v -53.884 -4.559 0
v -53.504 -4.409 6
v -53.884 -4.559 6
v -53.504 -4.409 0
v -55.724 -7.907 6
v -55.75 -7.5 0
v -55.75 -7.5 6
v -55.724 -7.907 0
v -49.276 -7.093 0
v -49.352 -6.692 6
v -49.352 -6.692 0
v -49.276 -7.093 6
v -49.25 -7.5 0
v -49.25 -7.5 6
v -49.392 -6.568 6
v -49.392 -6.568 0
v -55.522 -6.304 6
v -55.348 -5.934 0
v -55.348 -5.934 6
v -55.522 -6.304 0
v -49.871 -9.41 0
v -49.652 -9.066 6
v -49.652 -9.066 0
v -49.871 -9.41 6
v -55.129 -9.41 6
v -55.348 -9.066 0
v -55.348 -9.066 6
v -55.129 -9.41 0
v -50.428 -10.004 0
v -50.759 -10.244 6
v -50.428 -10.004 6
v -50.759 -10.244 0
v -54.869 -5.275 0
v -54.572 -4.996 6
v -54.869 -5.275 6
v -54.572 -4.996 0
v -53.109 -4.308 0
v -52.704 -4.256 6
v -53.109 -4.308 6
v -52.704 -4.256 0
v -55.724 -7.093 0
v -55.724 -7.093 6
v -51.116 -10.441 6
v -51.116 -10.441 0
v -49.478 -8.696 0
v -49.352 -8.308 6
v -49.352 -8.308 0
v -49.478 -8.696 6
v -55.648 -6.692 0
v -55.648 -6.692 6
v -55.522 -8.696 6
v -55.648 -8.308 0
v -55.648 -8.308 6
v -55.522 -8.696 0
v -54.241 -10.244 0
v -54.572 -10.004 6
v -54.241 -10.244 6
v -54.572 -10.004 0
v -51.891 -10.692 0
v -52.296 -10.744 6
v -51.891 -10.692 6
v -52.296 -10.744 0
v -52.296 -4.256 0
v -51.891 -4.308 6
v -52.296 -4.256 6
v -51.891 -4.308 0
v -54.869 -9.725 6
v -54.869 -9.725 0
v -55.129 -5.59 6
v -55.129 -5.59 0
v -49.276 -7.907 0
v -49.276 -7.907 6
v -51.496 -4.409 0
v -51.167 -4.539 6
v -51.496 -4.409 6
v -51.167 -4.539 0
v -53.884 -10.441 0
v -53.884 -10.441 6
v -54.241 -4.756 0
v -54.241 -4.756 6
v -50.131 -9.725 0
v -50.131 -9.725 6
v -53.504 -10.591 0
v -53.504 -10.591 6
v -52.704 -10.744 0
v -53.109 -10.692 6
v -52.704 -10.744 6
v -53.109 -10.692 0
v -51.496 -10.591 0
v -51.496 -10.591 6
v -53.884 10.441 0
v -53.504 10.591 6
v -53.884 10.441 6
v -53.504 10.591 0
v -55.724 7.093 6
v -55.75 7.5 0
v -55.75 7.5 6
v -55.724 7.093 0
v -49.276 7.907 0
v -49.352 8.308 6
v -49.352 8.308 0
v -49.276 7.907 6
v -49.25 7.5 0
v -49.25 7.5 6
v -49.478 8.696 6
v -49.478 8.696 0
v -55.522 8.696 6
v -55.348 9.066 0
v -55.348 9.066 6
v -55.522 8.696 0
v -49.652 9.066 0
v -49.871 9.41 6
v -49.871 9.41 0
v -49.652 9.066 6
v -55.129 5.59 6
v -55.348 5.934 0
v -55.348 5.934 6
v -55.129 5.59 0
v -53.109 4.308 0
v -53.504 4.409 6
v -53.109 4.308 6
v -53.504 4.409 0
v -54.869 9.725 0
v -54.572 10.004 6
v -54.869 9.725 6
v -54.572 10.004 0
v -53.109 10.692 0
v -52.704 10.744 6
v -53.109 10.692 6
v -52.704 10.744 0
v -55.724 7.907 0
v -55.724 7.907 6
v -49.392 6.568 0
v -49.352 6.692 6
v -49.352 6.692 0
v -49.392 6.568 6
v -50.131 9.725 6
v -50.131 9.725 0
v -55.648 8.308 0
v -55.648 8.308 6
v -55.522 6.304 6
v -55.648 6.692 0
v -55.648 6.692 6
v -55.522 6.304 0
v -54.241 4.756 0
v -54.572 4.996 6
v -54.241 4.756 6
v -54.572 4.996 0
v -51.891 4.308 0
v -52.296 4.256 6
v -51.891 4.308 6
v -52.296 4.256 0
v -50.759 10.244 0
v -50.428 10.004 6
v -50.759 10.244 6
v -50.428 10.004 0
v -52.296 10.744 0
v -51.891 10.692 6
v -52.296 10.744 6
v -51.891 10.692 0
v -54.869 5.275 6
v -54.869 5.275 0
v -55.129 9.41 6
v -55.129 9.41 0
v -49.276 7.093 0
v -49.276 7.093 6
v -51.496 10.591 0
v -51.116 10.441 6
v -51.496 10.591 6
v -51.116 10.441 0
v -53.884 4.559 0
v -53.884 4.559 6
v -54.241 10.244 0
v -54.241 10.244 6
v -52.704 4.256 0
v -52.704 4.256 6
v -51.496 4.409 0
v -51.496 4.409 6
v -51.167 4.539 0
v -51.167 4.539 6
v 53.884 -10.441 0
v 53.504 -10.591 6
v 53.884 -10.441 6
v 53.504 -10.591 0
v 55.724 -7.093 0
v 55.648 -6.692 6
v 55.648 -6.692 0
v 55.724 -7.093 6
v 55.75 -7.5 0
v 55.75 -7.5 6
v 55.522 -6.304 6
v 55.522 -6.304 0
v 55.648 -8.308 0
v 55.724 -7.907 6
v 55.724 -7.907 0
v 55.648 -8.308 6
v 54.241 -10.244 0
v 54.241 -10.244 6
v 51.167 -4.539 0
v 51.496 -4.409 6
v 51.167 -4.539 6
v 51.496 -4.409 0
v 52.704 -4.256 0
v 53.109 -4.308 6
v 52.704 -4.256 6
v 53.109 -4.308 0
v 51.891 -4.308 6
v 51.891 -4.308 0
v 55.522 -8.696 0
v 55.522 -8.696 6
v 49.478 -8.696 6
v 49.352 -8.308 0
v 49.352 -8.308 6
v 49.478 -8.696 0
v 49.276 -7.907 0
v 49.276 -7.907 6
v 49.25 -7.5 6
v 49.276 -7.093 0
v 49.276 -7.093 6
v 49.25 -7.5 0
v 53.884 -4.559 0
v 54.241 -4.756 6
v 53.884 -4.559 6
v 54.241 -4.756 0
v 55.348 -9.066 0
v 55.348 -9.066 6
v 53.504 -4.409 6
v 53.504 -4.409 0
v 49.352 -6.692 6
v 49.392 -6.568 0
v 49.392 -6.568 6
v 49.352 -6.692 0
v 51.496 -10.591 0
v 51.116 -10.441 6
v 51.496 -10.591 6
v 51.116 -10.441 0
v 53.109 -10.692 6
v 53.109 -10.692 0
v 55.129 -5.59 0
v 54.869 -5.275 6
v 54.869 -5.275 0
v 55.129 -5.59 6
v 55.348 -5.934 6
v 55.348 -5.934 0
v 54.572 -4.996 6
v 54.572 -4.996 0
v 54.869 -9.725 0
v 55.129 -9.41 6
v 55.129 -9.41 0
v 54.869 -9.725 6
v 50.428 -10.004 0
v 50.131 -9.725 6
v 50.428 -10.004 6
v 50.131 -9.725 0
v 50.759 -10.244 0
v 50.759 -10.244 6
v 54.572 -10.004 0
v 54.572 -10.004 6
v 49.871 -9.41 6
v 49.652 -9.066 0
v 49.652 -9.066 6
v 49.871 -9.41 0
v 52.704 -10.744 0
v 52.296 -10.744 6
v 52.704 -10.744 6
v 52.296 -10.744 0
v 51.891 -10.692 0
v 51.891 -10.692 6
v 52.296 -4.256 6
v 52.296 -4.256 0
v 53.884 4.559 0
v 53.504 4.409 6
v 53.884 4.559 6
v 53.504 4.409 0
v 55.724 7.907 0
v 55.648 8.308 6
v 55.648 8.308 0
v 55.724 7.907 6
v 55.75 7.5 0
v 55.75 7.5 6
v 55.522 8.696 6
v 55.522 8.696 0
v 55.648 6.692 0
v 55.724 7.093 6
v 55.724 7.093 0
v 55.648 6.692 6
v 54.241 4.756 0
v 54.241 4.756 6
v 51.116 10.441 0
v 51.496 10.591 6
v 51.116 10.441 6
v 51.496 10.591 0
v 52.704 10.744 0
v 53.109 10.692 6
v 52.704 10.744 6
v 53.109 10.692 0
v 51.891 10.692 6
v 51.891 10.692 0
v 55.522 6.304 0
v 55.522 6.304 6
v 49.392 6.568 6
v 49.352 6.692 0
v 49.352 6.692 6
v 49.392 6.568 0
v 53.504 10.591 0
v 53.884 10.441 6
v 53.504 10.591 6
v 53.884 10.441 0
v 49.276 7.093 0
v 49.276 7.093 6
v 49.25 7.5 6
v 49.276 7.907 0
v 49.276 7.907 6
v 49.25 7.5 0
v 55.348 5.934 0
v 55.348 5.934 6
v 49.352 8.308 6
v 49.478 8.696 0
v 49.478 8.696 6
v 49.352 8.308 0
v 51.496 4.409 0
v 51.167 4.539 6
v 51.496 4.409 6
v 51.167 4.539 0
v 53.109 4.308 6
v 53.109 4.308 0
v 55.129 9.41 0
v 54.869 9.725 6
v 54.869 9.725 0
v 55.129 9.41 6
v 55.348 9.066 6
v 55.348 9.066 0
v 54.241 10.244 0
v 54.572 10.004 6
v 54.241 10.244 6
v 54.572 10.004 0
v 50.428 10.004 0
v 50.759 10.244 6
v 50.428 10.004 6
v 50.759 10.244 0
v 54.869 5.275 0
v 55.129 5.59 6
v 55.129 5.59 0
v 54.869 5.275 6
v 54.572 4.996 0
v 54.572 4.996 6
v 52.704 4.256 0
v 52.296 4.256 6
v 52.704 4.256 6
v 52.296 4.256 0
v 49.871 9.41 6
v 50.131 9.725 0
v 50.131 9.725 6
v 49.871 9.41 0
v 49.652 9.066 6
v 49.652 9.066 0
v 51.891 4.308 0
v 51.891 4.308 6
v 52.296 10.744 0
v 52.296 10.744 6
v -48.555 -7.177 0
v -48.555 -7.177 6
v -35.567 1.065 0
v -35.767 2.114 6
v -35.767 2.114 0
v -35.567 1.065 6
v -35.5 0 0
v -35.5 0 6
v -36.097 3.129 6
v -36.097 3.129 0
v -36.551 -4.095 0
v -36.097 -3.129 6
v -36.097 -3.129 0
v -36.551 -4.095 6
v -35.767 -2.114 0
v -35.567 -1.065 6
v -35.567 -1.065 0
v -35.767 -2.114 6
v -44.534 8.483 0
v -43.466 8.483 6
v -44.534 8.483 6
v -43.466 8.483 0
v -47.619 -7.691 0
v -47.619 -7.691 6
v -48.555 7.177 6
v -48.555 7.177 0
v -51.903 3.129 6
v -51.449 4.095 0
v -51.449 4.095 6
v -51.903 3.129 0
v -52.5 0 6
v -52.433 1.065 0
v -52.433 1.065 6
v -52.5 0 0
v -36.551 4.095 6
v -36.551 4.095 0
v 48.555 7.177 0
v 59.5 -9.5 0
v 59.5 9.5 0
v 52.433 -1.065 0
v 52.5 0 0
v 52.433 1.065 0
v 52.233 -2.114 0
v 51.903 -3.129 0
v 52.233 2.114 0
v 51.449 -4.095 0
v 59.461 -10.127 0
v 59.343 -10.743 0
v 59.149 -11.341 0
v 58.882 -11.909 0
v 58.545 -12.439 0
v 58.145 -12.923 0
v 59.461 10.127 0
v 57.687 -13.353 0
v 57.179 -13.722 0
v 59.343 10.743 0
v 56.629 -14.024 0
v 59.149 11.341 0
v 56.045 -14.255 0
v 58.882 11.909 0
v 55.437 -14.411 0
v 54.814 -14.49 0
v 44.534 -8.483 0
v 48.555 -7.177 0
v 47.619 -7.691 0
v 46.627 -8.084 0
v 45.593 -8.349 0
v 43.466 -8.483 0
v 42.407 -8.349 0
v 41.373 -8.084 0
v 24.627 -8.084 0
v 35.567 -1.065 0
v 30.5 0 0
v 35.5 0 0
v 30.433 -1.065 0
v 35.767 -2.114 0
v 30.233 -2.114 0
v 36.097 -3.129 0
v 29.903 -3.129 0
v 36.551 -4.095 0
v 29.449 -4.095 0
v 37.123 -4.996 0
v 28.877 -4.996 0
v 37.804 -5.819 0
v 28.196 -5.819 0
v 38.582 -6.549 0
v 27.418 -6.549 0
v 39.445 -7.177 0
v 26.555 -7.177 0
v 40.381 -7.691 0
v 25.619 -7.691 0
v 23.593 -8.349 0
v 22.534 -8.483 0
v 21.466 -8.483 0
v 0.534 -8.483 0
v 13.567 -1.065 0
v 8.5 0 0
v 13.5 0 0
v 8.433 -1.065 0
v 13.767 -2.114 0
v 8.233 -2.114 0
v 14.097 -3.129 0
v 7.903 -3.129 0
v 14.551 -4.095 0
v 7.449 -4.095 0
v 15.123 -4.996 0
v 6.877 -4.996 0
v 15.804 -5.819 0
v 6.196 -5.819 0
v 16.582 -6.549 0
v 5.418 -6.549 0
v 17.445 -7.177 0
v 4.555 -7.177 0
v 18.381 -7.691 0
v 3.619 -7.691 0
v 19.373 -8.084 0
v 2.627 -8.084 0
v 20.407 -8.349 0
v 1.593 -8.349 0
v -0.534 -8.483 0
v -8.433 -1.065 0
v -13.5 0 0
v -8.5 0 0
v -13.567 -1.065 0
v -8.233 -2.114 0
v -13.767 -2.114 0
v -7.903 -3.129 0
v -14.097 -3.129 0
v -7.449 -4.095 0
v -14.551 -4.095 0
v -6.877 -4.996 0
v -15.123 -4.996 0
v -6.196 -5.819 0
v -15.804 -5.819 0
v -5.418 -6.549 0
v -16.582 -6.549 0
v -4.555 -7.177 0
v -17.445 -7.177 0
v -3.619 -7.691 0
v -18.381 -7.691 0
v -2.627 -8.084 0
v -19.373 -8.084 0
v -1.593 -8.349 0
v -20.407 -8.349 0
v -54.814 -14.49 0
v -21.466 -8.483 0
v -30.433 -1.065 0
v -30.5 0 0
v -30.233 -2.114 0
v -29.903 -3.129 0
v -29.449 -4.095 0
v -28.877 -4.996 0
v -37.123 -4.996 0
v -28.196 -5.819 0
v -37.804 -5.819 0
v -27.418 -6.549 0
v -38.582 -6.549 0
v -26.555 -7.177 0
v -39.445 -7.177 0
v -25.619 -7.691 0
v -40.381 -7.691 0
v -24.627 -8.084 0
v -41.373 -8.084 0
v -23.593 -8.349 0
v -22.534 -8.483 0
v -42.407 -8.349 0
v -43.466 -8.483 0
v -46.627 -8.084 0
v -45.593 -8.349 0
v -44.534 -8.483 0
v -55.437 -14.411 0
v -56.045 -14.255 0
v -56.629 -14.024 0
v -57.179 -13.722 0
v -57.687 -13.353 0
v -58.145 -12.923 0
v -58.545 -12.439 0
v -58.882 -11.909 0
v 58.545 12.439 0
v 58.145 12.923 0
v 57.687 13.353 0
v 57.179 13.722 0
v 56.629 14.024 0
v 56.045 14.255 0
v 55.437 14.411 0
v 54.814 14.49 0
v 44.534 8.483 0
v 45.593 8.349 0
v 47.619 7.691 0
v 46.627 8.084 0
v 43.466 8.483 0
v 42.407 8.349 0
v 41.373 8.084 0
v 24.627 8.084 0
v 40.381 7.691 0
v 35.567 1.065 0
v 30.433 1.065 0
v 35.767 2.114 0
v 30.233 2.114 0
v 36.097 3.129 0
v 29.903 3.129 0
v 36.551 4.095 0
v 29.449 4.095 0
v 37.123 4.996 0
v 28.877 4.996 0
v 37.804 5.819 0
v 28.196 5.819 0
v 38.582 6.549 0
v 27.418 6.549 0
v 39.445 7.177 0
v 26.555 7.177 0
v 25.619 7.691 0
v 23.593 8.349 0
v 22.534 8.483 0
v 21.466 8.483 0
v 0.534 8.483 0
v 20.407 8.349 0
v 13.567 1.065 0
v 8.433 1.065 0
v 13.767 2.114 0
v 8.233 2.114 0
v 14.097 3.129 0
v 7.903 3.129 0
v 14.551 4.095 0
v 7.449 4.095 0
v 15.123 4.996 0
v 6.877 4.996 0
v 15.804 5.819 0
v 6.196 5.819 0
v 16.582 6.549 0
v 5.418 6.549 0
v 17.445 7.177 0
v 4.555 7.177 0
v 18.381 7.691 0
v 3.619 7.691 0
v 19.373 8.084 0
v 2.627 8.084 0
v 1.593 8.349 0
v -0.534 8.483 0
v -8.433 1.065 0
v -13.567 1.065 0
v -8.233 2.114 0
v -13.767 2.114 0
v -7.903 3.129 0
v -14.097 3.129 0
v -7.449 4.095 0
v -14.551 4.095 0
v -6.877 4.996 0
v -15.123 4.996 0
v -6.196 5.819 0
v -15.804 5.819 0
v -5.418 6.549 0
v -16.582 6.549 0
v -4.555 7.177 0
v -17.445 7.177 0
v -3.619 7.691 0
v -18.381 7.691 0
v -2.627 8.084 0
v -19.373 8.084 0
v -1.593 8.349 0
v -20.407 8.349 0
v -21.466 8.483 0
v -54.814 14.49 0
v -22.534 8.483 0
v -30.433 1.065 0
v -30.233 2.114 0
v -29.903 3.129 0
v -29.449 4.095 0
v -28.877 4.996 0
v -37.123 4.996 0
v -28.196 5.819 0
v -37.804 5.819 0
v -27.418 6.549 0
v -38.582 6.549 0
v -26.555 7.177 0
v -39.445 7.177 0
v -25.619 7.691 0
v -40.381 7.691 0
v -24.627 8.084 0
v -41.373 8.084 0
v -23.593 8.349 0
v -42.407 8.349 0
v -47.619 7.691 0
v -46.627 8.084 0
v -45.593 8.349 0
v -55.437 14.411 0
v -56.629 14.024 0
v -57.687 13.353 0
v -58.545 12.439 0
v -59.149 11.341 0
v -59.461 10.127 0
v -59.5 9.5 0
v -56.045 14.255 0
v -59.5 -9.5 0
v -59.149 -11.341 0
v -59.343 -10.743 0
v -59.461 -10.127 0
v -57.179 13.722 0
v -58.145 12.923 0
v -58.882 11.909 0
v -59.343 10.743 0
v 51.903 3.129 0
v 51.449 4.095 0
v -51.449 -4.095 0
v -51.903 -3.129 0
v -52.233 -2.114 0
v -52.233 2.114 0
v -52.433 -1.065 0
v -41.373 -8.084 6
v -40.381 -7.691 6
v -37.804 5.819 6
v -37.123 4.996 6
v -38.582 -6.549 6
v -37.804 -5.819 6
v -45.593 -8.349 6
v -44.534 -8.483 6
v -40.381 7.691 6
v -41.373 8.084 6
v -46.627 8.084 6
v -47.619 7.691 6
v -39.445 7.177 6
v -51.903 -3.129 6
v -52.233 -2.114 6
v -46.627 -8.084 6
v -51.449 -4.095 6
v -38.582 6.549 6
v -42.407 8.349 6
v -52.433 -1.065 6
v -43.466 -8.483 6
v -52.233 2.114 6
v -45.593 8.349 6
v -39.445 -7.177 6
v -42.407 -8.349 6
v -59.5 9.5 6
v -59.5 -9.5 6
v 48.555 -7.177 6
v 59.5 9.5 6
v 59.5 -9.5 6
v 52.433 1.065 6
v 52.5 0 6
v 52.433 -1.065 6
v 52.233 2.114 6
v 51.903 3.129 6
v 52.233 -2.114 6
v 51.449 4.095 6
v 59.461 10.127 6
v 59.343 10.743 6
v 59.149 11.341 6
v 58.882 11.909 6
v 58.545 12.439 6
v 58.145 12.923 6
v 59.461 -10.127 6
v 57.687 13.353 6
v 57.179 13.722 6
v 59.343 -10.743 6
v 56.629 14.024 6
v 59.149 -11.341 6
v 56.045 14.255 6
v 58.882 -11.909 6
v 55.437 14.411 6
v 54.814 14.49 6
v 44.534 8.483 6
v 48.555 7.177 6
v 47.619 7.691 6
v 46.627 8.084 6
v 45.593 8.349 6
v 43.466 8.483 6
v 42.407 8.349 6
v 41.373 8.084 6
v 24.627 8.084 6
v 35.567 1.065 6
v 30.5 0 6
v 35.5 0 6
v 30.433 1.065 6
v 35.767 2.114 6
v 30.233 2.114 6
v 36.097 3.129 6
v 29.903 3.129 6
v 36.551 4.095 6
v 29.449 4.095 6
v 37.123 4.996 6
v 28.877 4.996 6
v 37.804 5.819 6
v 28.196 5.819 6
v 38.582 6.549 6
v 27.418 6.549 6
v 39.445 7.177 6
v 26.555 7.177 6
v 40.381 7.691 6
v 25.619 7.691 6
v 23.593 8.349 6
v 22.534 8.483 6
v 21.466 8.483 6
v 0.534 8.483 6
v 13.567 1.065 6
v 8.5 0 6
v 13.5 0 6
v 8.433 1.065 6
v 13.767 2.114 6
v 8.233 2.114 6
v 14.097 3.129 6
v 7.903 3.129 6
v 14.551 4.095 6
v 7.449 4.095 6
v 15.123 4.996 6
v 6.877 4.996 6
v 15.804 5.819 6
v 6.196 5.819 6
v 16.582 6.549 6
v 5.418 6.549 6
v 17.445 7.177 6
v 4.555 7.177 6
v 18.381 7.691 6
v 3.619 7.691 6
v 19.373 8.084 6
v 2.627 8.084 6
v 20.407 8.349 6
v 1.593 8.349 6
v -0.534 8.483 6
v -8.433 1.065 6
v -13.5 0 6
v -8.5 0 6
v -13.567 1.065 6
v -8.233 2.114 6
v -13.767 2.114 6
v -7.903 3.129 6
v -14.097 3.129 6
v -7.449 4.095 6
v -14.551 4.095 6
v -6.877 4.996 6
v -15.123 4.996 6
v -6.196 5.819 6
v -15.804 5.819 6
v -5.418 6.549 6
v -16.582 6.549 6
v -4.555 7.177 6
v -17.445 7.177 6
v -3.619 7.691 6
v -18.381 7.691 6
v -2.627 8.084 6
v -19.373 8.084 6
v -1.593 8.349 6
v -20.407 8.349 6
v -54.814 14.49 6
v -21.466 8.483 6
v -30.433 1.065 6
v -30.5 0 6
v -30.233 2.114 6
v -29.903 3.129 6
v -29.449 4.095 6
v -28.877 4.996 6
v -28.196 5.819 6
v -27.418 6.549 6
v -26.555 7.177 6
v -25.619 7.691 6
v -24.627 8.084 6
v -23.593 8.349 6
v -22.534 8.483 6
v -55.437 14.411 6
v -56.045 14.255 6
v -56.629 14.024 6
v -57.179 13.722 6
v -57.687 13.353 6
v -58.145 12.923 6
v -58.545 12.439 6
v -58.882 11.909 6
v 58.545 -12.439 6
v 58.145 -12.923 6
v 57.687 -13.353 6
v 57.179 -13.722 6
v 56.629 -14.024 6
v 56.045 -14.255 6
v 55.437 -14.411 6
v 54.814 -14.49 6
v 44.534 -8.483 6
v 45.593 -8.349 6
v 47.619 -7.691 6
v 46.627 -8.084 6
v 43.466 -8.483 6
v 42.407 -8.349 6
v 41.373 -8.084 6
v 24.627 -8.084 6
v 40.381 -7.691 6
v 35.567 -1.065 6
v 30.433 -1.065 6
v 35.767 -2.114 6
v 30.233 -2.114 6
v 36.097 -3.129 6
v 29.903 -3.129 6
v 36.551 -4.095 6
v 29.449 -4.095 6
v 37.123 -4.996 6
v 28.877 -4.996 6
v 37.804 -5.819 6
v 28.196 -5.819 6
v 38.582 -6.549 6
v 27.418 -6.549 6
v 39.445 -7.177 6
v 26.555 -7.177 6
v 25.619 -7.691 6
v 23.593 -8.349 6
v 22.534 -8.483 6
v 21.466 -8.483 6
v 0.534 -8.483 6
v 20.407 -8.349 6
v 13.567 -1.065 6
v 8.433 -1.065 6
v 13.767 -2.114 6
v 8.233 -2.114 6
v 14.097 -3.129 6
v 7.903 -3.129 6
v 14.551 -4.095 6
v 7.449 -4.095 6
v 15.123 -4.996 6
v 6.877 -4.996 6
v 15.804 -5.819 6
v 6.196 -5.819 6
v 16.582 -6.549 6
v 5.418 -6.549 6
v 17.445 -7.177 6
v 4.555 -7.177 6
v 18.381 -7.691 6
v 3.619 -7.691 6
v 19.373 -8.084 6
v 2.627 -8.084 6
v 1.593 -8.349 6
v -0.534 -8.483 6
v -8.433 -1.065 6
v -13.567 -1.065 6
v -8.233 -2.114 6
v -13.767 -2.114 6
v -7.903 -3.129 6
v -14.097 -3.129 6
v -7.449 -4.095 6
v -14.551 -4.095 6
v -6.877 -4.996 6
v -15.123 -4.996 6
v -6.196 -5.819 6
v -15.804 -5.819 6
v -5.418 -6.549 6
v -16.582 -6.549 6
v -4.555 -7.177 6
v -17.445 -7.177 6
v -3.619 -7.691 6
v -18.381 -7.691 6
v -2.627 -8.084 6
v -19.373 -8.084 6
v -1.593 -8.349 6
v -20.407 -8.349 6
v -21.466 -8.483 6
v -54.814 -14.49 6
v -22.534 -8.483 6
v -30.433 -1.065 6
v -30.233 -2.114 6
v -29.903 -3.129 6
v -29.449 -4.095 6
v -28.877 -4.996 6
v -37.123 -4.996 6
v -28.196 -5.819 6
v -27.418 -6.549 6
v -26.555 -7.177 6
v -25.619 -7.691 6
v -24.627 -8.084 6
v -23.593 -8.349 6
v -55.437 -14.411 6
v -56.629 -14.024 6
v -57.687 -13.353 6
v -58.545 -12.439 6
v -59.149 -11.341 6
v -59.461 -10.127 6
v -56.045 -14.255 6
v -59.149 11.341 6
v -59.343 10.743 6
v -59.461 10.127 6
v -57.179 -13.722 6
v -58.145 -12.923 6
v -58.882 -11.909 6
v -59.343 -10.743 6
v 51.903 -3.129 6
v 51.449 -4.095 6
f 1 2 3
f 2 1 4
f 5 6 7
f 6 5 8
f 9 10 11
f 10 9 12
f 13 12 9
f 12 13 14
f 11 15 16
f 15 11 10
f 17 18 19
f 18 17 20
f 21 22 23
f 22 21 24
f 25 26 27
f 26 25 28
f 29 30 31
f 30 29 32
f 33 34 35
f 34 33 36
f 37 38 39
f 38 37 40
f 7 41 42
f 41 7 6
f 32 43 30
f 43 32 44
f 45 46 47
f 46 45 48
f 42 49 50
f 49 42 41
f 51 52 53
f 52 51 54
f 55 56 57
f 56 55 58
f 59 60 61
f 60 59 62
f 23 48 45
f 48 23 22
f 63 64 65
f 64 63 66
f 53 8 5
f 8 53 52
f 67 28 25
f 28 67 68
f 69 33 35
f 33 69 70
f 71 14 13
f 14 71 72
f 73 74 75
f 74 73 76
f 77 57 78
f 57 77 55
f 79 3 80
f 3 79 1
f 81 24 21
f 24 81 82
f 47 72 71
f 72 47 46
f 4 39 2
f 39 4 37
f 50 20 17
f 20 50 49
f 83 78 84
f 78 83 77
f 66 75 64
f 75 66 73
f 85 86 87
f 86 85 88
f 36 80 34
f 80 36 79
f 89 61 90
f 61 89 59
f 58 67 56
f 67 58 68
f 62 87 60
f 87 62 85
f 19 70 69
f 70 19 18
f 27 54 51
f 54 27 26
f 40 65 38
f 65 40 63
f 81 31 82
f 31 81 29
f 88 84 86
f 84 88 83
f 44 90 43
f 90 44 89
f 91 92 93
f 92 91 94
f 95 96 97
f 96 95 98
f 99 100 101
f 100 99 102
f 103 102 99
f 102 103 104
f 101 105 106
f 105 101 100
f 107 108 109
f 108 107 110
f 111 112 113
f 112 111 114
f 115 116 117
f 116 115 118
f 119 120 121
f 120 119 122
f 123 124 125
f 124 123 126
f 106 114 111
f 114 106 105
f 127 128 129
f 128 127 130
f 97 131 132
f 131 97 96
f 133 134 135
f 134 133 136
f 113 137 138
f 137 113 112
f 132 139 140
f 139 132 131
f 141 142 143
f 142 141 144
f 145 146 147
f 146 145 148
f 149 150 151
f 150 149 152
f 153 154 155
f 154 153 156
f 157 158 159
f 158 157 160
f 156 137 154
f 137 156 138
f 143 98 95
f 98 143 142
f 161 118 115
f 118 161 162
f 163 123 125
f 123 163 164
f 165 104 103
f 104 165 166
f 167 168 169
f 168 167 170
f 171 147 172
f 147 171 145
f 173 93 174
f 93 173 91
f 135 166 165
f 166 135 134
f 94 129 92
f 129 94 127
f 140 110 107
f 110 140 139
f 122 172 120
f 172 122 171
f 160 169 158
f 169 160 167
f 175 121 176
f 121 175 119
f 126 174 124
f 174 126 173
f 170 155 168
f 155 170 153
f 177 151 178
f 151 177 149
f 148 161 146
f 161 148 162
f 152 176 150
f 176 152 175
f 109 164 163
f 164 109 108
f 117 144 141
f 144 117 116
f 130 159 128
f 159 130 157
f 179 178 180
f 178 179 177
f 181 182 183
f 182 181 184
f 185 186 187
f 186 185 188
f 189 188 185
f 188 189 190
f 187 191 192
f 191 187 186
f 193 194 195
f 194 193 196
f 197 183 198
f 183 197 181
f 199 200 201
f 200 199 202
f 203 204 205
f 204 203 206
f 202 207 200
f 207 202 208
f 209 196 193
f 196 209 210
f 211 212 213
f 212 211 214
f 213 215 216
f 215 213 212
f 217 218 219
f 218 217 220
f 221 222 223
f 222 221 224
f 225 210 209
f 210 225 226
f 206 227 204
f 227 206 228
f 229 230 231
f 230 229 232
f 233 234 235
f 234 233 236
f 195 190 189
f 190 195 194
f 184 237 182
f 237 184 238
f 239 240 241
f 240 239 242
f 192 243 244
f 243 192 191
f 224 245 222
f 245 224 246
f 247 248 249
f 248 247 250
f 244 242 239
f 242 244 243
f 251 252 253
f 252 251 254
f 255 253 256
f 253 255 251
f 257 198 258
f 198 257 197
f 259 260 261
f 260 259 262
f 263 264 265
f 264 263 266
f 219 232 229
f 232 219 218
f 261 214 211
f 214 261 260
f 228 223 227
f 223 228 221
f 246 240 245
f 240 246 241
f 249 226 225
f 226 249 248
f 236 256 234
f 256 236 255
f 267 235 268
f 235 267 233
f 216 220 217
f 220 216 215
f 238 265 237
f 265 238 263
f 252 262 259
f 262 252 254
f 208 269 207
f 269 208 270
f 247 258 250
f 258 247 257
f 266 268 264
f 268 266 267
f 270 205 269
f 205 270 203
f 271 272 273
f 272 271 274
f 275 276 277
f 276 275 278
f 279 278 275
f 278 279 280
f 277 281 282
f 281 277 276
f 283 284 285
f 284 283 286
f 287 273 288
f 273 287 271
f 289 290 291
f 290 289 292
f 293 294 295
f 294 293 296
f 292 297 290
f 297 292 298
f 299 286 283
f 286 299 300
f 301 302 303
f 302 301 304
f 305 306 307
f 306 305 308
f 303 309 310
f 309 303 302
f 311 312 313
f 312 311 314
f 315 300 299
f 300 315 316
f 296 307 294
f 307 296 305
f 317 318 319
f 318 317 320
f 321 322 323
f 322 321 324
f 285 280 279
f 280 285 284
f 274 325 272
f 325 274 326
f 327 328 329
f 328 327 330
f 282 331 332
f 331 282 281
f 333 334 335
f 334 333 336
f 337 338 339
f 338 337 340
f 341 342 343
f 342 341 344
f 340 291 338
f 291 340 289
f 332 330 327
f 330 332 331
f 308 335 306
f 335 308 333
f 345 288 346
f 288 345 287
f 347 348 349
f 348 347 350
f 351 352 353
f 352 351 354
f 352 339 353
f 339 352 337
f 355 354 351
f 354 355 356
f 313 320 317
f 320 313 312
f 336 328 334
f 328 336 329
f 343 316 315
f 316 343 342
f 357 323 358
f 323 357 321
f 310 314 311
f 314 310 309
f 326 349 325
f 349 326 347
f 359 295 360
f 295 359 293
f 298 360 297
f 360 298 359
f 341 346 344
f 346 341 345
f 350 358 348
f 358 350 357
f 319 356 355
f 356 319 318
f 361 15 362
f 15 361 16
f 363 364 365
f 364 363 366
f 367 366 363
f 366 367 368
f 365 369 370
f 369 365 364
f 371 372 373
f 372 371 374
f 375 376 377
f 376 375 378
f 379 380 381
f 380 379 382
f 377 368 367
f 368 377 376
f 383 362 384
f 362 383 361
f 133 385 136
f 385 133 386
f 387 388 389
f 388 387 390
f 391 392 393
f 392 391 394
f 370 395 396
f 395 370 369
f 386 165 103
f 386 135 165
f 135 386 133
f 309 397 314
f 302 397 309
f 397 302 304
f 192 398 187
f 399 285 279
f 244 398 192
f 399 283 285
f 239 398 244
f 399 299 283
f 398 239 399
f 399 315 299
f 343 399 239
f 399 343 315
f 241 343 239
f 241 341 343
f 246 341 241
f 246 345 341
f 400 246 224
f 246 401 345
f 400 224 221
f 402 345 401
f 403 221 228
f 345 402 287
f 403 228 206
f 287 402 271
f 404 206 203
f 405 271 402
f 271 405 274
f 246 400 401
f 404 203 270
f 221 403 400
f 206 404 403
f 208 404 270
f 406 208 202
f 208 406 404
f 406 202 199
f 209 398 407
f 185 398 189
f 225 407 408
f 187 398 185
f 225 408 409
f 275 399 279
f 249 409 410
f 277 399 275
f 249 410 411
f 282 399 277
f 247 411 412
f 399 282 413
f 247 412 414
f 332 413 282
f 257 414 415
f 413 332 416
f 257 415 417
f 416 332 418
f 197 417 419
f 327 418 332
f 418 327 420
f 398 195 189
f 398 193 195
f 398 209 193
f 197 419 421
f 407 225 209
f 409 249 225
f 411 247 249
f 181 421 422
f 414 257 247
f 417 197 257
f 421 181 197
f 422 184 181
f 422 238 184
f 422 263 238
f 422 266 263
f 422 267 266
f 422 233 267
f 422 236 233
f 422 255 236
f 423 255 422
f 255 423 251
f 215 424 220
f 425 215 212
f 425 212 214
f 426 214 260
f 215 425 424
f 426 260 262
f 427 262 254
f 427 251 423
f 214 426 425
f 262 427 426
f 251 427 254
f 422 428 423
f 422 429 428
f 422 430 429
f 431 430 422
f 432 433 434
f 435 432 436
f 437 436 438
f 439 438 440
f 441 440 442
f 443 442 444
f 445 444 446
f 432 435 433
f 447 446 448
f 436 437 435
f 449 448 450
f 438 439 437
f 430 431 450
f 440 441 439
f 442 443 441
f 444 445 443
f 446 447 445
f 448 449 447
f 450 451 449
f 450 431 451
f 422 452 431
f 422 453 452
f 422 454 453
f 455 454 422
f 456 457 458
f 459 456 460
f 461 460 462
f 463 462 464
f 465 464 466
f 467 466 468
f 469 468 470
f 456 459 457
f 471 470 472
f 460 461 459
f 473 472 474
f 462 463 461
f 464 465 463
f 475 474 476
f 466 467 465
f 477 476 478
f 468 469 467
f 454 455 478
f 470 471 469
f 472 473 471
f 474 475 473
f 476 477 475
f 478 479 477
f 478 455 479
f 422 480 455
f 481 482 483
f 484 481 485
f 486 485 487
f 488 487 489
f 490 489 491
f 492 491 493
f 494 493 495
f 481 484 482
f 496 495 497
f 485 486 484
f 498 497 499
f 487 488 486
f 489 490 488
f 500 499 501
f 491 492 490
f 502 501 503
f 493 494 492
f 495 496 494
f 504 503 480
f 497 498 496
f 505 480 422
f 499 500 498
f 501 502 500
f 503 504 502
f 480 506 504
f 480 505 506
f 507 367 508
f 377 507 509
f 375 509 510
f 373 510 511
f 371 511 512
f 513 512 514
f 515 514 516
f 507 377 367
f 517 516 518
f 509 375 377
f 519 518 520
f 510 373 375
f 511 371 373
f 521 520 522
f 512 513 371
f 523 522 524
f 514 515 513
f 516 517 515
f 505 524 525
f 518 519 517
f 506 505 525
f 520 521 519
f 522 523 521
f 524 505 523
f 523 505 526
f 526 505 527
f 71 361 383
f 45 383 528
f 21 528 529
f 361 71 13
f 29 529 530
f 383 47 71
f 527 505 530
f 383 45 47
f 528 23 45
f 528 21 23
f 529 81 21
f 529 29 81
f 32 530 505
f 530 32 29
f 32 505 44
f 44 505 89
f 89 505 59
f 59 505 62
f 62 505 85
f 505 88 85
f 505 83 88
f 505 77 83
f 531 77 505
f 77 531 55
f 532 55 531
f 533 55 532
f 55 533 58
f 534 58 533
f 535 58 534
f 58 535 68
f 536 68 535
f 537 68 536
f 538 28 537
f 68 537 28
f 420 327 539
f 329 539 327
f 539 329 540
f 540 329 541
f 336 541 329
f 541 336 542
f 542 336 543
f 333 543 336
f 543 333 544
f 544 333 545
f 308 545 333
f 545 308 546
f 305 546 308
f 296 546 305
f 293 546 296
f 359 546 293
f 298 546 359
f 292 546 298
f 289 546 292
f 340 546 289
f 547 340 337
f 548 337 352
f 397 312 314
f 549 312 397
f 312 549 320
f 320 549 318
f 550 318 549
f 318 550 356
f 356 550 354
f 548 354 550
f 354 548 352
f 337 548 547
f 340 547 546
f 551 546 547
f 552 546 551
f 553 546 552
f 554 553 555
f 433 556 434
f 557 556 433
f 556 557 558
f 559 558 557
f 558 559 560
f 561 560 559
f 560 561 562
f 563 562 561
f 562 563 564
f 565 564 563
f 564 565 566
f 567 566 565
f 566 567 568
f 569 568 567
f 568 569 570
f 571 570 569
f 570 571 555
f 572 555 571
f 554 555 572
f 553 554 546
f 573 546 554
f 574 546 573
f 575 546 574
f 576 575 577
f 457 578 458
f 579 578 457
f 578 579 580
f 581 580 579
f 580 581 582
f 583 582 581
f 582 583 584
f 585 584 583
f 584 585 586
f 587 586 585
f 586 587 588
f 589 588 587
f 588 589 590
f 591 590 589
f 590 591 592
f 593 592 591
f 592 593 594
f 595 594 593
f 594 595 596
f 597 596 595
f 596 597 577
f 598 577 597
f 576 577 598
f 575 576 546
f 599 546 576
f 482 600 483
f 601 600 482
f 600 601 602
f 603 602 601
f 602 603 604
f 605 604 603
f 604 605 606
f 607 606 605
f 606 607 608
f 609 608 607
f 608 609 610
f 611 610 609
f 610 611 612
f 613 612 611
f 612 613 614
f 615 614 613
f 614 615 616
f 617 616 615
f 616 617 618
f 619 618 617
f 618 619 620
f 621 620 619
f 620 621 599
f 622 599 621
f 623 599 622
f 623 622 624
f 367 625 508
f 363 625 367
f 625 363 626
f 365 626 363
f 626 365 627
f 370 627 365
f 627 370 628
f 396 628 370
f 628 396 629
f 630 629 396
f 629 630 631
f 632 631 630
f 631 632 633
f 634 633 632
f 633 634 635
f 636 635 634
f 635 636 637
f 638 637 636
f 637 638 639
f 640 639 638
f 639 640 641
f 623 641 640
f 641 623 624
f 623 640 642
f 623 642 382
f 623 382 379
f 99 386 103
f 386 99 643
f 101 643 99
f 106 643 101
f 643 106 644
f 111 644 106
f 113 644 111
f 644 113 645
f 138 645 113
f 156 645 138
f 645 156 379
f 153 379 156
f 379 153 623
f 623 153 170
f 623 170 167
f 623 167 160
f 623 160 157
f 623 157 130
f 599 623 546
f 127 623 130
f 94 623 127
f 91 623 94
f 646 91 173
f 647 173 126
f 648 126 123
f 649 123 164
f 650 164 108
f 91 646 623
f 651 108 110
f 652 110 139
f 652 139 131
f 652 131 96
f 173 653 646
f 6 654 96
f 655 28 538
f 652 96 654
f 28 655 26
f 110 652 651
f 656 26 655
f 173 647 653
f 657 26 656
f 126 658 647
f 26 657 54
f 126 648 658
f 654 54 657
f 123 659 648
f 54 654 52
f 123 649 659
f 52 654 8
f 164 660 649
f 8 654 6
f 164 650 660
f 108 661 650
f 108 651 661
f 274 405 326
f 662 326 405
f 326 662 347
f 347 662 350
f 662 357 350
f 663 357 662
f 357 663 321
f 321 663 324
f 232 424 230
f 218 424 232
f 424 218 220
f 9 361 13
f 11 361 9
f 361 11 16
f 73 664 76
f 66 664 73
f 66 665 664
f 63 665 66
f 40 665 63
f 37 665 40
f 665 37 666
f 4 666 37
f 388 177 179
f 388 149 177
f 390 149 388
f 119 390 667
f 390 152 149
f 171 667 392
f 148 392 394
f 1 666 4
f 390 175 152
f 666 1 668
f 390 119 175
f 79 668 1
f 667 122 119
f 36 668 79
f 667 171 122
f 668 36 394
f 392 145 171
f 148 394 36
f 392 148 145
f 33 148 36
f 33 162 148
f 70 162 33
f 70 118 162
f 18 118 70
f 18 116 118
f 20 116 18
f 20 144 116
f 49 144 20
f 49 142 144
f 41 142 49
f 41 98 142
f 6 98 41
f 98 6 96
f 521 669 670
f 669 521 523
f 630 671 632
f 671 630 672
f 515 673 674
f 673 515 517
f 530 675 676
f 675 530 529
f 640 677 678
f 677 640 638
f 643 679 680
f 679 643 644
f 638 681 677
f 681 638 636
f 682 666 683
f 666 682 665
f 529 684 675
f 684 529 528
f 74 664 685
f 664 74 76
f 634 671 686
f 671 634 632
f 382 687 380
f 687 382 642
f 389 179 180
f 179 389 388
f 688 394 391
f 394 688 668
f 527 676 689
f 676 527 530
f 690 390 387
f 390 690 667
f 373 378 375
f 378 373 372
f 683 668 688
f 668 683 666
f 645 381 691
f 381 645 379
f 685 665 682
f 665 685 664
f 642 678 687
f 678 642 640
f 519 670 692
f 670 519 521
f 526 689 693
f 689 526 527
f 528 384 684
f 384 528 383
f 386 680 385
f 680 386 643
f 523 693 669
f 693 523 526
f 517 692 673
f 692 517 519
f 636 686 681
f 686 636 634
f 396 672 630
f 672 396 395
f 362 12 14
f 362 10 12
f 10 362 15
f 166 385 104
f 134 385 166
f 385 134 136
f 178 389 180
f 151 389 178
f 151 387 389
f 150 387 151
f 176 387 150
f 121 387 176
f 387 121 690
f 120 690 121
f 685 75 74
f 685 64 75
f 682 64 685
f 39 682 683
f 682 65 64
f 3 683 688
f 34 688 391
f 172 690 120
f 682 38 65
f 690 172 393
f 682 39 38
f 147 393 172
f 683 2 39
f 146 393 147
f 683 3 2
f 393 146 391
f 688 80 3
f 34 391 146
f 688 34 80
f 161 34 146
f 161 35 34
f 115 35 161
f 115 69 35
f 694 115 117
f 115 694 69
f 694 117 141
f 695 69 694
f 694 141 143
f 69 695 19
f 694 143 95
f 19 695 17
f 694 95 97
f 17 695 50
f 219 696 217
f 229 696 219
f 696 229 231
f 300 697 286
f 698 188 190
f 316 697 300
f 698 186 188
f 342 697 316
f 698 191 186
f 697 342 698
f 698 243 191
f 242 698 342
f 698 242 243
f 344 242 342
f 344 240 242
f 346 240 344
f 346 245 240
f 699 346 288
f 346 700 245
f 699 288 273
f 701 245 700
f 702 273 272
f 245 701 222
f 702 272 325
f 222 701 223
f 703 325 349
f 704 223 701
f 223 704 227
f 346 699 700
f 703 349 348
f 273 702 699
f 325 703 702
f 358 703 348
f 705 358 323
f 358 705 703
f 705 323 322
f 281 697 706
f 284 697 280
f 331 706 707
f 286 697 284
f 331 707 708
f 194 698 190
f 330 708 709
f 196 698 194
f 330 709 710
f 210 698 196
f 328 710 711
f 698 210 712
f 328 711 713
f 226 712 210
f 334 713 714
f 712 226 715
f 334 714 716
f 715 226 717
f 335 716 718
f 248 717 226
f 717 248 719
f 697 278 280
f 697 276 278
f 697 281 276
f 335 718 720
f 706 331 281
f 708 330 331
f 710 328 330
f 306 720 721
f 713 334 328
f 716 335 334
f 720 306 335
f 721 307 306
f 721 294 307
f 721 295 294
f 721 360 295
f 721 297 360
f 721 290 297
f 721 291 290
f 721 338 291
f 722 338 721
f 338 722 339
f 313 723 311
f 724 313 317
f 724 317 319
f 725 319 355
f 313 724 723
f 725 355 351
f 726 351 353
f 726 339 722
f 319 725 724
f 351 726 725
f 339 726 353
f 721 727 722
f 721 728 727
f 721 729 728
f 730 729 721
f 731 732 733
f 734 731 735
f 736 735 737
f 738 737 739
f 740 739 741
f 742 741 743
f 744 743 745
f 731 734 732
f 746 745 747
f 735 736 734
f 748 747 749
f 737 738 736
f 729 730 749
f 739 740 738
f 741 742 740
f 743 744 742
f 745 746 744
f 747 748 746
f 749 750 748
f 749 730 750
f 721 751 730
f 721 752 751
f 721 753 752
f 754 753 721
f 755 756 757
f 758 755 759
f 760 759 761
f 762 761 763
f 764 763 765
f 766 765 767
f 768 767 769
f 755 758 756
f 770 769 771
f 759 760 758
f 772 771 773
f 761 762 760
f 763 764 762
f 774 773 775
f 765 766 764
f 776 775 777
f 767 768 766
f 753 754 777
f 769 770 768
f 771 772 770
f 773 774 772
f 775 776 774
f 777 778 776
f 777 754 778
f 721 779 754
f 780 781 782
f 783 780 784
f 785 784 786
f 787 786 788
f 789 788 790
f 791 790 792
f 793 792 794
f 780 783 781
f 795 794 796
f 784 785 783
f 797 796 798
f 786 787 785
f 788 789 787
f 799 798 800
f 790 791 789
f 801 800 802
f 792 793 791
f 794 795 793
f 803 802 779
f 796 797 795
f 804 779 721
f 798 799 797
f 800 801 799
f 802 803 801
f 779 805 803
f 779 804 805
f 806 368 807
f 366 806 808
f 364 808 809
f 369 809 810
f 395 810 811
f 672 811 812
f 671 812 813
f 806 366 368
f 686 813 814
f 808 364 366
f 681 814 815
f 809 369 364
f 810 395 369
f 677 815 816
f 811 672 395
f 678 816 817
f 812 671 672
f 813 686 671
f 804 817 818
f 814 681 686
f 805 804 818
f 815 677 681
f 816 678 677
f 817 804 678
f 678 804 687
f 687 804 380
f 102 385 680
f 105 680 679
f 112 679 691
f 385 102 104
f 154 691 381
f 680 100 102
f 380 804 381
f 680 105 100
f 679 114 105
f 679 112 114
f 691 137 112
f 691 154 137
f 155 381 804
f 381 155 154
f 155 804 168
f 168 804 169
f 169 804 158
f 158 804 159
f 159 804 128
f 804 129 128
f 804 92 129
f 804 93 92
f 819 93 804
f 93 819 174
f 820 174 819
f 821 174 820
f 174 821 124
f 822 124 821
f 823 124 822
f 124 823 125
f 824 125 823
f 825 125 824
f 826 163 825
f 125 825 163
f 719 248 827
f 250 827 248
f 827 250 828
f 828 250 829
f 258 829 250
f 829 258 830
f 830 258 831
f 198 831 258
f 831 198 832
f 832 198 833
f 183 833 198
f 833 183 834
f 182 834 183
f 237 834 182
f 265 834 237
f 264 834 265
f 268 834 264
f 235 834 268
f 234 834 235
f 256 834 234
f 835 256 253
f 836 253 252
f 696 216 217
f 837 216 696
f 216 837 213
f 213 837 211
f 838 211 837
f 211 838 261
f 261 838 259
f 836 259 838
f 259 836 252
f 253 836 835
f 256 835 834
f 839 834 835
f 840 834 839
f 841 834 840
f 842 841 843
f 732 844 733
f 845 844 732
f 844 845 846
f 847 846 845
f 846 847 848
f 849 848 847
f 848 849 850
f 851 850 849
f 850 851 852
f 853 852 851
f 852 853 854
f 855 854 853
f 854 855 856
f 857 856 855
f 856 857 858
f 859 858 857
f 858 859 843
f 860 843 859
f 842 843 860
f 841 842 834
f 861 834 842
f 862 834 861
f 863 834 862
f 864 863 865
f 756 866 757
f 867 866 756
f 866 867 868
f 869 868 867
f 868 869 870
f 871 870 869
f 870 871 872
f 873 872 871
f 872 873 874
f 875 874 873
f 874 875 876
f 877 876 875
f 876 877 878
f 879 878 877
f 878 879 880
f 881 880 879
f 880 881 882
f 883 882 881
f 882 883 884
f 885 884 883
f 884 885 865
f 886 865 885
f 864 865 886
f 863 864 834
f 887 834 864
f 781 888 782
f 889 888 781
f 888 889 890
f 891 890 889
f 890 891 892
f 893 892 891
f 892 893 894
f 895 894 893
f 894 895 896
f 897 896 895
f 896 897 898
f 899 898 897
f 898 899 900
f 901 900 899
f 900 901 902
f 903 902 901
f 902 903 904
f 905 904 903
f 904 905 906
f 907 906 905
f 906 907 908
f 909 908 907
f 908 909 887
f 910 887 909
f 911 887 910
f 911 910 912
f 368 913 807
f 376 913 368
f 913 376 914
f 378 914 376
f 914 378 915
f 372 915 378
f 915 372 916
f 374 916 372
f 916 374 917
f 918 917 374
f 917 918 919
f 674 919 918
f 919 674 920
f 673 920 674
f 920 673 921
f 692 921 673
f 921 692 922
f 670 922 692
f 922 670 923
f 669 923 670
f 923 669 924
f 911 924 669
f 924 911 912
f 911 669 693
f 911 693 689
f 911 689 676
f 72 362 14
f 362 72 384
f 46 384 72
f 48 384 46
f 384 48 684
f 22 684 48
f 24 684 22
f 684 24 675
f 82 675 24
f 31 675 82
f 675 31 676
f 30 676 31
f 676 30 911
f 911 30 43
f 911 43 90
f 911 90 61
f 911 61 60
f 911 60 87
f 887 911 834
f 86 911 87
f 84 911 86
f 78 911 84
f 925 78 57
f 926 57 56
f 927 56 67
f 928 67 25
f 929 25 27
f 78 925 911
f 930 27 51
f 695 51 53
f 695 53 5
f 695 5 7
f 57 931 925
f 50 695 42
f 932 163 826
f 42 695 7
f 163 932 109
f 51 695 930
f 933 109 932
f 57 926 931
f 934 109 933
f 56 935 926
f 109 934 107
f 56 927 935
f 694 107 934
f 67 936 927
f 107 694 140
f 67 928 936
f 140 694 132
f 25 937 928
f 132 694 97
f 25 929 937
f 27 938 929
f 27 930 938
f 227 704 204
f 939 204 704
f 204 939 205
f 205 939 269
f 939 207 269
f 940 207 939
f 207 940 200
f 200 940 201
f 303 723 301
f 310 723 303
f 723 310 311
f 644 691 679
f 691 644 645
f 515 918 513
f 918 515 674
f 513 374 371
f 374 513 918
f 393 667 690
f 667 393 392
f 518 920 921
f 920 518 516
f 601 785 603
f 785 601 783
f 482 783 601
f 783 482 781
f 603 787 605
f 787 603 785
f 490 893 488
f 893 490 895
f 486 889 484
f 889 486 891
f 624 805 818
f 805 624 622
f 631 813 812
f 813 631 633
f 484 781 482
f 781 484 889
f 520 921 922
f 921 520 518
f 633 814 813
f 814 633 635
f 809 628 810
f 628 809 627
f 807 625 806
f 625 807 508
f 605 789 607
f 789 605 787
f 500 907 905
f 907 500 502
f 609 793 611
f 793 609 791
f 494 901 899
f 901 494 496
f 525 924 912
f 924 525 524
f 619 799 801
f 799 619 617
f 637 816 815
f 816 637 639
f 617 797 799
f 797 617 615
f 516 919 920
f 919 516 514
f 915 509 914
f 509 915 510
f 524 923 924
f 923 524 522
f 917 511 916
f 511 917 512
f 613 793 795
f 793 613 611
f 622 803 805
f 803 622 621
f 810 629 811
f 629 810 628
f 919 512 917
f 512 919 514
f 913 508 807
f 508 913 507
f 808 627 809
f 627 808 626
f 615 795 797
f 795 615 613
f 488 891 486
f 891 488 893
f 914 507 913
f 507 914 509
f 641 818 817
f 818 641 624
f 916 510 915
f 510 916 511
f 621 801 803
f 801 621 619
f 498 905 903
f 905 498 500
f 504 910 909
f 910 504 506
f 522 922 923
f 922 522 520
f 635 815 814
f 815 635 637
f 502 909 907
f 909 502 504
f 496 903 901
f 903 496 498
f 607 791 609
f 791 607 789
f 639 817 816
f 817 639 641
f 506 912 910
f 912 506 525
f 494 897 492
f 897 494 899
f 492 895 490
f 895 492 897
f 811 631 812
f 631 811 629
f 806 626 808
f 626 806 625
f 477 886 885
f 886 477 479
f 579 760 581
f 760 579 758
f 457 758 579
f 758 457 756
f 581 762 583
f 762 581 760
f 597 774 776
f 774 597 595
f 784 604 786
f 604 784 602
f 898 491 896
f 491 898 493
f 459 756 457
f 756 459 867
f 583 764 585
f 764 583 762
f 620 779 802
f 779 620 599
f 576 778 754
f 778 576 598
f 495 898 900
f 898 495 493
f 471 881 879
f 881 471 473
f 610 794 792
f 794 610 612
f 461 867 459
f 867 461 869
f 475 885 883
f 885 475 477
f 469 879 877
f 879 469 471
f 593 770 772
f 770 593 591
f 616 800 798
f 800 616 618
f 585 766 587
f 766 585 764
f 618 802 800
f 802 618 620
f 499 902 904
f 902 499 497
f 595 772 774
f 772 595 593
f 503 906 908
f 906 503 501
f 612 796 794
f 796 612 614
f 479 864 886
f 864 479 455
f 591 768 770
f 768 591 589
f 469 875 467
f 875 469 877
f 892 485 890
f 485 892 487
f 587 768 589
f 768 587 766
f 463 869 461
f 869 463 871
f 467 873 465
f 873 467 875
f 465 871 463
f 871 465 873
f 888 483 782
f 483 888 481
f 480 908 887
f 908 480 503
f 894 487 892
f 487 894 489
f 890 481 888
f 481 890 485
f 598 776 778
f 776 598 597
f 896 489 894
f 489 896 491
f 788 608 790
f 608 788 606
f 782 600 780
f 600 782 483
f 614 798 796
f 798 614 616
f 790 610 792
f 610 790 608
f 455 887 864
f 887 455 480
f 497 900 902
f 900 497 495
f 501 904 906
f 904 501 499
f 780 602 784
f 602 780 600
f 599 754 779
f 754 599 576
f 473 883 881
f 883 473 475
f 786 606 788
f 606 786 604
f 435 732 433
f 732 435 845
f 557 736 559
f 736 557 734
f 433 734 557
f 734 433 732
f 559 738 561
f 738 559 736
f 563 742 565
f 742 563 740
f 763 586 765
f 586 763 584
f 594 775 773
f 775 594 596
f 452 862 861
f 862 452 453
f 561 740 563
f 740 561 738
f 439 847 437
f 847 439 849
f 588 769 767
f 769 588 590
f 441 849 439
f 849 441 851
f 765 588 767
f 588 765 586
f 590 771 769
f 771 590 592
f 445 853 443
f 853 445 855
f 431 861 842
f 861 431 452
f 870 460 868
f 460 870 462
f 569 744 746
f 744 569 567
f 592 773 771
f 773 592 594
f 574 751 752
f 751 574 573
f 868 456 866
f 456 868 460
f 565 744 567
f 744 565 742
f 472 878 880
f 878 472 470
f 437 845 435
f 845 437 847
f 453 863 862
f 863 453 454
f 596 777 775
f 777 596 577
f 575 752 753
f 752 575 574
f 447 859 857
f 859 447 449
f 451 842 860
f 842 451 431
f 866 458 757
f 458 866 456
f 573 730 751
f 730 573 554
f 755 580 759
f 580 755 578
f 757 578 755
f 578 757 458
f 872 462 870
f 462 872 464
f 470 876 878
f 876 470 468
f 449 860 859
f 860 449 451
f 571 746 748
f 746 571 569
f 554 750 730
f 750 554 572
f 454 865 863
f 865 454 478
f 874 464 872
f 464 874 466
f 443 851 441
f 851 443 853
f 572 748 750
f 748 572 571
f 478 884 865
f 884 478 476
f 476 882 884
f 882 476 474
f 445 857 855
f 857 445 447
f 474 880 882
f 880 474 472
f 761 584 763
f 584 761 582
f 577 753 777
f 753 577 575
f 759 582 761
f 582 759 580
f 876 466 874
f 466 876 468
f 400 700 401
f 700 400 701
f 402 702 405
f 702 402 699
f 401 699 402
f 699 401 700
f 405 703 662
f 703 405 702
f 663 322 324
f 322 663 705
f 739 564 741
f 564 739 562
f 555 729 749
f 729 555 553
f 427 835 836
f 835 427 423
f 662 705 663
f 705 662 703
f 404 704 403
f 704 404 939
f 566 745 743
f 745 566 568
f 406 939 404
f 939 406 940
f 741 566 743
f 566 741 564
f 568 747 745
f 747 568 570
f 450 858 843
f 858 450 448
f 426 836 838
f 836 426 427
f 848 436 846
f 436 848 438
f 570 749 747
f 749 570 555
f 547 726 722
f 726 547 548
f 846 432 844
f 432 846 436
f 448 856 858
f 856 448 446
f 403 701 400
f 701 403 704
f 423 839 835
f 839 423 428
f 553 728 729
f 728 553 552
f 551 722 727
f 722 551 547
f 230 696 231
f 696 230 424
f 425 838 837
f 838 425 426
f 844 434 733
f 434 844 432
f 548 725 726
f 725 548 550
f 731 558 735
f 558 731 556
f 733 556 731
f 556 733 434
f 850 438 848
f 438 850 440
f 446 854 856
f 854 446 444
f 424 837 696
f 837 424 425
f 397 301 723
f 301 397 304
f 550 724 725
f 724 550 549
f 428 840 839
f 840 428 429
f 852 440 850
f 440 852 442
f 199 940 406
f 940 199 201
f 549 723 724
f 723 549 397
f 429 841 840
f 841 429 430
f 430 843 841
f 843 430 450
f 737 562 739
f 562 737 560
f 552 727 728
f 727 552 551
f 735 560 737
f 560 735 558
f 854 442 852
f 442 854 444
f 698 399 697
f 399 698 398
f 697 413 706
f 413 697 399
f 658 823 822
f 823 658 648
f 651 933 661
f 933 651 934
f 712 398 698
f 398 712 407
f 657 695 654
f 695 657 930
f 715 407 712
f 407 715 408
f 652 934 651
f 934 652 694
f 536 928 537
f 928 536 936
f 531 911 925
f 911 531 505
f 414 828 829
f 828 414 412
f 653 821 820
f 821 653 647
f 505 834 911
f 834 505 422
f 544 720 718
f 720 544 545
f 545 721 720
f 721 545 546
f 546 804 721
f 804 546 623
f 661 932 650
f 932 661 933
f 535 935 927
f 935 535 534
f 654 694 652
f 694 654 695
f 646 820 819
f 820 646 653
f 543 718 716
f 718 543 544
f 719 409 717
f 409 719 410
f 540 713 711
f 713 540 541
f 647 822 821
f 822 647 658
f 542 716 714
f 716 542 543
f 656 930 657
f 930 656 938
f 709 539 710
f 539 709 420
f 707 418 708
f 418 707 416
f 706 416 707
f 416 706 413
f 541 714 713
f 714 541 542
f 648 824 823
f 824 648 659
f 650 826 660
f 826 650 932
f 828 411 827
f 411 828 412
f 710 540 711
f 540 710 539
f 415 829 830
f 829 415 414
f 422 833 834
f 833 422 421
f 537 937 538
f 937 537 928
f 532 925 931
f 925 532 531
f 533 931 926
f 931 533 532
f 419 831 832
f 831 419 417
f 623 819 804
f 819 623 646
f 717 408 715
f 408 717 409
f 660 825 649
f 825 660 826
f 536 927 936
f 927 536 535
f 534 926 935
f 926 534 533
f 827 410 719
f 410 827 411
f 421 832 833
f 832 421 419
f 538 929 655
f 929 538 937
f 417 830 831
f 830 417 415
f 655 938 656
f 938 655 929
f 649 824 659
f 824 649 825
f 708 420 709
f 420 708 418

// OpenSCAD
$fn = 50;

difference() {
	union() {
		hull() {
			translate(v = [-54.5, 9.5, 0]) {
				cylinder(h = 6, r = 5);
			}
			translate(v = [54.5, 9.5, 0]) {
				cylinder(h = 6, r = 5);
			}
			translate(v = [-54.5, -9.5, 0]) {
				cylinder(h = 6, r = 5);
			}
			translate(v = [54.5, -9.5, 0]) {
				cylinder(h = 6, r = 5);
			}
		}
	}
	union() {
		translate(v = [-52.5, -7.5, -100.0]) {
			cylinder(h = 200, r = 3.25);
		}
		translate(v = [-52.5, 7.5, -100.0]) {
			cylinder(h = 200, r = 3.25);
		}
		translate(v = [52.5, -7.5, -100.0]) {
			cylinder(h = 200, r = 3.25);
		}
		translate(v = [52.5, 7.5, -100.0]) {
			cylinder(h = 200, r = 3.25);
		}
		translate(v = [-52.5, -7.5, -100.0]) {
			cylinder(h = 200, r = 1.8);
		}
		translate(v = [-52.5, 7.5, -100.0]) {
			cylinder(h = 200, r = 1.8);
		}
		translate(v = [52.5, -7.5, -100.0]) {
			cylinder(h = 200, r = 1.8);
		}
		translate(v = [52.5, 7.5, -100.0]) {
			cylinder(h = 200, r = 1.8);
		}
		translate(v = [-44.0, 0, 0.0]) {
			cylinder(h = 6, r = 8.5);
		}
		translate(v = [-22.0, 0, 0.0]) {
			cylinder(h = 6, r = 8.5);
		}
		cylinder(h = 6, r = 8.5);
		translate(v = [22.0, 0, 0.0]) {
			cylinder(h = 6, r = 8.5);
		}
		translate(v = [44.0, 0, 0.0]) {
			cylinder(h = 6, r = 8.5);
		}
	}
}
